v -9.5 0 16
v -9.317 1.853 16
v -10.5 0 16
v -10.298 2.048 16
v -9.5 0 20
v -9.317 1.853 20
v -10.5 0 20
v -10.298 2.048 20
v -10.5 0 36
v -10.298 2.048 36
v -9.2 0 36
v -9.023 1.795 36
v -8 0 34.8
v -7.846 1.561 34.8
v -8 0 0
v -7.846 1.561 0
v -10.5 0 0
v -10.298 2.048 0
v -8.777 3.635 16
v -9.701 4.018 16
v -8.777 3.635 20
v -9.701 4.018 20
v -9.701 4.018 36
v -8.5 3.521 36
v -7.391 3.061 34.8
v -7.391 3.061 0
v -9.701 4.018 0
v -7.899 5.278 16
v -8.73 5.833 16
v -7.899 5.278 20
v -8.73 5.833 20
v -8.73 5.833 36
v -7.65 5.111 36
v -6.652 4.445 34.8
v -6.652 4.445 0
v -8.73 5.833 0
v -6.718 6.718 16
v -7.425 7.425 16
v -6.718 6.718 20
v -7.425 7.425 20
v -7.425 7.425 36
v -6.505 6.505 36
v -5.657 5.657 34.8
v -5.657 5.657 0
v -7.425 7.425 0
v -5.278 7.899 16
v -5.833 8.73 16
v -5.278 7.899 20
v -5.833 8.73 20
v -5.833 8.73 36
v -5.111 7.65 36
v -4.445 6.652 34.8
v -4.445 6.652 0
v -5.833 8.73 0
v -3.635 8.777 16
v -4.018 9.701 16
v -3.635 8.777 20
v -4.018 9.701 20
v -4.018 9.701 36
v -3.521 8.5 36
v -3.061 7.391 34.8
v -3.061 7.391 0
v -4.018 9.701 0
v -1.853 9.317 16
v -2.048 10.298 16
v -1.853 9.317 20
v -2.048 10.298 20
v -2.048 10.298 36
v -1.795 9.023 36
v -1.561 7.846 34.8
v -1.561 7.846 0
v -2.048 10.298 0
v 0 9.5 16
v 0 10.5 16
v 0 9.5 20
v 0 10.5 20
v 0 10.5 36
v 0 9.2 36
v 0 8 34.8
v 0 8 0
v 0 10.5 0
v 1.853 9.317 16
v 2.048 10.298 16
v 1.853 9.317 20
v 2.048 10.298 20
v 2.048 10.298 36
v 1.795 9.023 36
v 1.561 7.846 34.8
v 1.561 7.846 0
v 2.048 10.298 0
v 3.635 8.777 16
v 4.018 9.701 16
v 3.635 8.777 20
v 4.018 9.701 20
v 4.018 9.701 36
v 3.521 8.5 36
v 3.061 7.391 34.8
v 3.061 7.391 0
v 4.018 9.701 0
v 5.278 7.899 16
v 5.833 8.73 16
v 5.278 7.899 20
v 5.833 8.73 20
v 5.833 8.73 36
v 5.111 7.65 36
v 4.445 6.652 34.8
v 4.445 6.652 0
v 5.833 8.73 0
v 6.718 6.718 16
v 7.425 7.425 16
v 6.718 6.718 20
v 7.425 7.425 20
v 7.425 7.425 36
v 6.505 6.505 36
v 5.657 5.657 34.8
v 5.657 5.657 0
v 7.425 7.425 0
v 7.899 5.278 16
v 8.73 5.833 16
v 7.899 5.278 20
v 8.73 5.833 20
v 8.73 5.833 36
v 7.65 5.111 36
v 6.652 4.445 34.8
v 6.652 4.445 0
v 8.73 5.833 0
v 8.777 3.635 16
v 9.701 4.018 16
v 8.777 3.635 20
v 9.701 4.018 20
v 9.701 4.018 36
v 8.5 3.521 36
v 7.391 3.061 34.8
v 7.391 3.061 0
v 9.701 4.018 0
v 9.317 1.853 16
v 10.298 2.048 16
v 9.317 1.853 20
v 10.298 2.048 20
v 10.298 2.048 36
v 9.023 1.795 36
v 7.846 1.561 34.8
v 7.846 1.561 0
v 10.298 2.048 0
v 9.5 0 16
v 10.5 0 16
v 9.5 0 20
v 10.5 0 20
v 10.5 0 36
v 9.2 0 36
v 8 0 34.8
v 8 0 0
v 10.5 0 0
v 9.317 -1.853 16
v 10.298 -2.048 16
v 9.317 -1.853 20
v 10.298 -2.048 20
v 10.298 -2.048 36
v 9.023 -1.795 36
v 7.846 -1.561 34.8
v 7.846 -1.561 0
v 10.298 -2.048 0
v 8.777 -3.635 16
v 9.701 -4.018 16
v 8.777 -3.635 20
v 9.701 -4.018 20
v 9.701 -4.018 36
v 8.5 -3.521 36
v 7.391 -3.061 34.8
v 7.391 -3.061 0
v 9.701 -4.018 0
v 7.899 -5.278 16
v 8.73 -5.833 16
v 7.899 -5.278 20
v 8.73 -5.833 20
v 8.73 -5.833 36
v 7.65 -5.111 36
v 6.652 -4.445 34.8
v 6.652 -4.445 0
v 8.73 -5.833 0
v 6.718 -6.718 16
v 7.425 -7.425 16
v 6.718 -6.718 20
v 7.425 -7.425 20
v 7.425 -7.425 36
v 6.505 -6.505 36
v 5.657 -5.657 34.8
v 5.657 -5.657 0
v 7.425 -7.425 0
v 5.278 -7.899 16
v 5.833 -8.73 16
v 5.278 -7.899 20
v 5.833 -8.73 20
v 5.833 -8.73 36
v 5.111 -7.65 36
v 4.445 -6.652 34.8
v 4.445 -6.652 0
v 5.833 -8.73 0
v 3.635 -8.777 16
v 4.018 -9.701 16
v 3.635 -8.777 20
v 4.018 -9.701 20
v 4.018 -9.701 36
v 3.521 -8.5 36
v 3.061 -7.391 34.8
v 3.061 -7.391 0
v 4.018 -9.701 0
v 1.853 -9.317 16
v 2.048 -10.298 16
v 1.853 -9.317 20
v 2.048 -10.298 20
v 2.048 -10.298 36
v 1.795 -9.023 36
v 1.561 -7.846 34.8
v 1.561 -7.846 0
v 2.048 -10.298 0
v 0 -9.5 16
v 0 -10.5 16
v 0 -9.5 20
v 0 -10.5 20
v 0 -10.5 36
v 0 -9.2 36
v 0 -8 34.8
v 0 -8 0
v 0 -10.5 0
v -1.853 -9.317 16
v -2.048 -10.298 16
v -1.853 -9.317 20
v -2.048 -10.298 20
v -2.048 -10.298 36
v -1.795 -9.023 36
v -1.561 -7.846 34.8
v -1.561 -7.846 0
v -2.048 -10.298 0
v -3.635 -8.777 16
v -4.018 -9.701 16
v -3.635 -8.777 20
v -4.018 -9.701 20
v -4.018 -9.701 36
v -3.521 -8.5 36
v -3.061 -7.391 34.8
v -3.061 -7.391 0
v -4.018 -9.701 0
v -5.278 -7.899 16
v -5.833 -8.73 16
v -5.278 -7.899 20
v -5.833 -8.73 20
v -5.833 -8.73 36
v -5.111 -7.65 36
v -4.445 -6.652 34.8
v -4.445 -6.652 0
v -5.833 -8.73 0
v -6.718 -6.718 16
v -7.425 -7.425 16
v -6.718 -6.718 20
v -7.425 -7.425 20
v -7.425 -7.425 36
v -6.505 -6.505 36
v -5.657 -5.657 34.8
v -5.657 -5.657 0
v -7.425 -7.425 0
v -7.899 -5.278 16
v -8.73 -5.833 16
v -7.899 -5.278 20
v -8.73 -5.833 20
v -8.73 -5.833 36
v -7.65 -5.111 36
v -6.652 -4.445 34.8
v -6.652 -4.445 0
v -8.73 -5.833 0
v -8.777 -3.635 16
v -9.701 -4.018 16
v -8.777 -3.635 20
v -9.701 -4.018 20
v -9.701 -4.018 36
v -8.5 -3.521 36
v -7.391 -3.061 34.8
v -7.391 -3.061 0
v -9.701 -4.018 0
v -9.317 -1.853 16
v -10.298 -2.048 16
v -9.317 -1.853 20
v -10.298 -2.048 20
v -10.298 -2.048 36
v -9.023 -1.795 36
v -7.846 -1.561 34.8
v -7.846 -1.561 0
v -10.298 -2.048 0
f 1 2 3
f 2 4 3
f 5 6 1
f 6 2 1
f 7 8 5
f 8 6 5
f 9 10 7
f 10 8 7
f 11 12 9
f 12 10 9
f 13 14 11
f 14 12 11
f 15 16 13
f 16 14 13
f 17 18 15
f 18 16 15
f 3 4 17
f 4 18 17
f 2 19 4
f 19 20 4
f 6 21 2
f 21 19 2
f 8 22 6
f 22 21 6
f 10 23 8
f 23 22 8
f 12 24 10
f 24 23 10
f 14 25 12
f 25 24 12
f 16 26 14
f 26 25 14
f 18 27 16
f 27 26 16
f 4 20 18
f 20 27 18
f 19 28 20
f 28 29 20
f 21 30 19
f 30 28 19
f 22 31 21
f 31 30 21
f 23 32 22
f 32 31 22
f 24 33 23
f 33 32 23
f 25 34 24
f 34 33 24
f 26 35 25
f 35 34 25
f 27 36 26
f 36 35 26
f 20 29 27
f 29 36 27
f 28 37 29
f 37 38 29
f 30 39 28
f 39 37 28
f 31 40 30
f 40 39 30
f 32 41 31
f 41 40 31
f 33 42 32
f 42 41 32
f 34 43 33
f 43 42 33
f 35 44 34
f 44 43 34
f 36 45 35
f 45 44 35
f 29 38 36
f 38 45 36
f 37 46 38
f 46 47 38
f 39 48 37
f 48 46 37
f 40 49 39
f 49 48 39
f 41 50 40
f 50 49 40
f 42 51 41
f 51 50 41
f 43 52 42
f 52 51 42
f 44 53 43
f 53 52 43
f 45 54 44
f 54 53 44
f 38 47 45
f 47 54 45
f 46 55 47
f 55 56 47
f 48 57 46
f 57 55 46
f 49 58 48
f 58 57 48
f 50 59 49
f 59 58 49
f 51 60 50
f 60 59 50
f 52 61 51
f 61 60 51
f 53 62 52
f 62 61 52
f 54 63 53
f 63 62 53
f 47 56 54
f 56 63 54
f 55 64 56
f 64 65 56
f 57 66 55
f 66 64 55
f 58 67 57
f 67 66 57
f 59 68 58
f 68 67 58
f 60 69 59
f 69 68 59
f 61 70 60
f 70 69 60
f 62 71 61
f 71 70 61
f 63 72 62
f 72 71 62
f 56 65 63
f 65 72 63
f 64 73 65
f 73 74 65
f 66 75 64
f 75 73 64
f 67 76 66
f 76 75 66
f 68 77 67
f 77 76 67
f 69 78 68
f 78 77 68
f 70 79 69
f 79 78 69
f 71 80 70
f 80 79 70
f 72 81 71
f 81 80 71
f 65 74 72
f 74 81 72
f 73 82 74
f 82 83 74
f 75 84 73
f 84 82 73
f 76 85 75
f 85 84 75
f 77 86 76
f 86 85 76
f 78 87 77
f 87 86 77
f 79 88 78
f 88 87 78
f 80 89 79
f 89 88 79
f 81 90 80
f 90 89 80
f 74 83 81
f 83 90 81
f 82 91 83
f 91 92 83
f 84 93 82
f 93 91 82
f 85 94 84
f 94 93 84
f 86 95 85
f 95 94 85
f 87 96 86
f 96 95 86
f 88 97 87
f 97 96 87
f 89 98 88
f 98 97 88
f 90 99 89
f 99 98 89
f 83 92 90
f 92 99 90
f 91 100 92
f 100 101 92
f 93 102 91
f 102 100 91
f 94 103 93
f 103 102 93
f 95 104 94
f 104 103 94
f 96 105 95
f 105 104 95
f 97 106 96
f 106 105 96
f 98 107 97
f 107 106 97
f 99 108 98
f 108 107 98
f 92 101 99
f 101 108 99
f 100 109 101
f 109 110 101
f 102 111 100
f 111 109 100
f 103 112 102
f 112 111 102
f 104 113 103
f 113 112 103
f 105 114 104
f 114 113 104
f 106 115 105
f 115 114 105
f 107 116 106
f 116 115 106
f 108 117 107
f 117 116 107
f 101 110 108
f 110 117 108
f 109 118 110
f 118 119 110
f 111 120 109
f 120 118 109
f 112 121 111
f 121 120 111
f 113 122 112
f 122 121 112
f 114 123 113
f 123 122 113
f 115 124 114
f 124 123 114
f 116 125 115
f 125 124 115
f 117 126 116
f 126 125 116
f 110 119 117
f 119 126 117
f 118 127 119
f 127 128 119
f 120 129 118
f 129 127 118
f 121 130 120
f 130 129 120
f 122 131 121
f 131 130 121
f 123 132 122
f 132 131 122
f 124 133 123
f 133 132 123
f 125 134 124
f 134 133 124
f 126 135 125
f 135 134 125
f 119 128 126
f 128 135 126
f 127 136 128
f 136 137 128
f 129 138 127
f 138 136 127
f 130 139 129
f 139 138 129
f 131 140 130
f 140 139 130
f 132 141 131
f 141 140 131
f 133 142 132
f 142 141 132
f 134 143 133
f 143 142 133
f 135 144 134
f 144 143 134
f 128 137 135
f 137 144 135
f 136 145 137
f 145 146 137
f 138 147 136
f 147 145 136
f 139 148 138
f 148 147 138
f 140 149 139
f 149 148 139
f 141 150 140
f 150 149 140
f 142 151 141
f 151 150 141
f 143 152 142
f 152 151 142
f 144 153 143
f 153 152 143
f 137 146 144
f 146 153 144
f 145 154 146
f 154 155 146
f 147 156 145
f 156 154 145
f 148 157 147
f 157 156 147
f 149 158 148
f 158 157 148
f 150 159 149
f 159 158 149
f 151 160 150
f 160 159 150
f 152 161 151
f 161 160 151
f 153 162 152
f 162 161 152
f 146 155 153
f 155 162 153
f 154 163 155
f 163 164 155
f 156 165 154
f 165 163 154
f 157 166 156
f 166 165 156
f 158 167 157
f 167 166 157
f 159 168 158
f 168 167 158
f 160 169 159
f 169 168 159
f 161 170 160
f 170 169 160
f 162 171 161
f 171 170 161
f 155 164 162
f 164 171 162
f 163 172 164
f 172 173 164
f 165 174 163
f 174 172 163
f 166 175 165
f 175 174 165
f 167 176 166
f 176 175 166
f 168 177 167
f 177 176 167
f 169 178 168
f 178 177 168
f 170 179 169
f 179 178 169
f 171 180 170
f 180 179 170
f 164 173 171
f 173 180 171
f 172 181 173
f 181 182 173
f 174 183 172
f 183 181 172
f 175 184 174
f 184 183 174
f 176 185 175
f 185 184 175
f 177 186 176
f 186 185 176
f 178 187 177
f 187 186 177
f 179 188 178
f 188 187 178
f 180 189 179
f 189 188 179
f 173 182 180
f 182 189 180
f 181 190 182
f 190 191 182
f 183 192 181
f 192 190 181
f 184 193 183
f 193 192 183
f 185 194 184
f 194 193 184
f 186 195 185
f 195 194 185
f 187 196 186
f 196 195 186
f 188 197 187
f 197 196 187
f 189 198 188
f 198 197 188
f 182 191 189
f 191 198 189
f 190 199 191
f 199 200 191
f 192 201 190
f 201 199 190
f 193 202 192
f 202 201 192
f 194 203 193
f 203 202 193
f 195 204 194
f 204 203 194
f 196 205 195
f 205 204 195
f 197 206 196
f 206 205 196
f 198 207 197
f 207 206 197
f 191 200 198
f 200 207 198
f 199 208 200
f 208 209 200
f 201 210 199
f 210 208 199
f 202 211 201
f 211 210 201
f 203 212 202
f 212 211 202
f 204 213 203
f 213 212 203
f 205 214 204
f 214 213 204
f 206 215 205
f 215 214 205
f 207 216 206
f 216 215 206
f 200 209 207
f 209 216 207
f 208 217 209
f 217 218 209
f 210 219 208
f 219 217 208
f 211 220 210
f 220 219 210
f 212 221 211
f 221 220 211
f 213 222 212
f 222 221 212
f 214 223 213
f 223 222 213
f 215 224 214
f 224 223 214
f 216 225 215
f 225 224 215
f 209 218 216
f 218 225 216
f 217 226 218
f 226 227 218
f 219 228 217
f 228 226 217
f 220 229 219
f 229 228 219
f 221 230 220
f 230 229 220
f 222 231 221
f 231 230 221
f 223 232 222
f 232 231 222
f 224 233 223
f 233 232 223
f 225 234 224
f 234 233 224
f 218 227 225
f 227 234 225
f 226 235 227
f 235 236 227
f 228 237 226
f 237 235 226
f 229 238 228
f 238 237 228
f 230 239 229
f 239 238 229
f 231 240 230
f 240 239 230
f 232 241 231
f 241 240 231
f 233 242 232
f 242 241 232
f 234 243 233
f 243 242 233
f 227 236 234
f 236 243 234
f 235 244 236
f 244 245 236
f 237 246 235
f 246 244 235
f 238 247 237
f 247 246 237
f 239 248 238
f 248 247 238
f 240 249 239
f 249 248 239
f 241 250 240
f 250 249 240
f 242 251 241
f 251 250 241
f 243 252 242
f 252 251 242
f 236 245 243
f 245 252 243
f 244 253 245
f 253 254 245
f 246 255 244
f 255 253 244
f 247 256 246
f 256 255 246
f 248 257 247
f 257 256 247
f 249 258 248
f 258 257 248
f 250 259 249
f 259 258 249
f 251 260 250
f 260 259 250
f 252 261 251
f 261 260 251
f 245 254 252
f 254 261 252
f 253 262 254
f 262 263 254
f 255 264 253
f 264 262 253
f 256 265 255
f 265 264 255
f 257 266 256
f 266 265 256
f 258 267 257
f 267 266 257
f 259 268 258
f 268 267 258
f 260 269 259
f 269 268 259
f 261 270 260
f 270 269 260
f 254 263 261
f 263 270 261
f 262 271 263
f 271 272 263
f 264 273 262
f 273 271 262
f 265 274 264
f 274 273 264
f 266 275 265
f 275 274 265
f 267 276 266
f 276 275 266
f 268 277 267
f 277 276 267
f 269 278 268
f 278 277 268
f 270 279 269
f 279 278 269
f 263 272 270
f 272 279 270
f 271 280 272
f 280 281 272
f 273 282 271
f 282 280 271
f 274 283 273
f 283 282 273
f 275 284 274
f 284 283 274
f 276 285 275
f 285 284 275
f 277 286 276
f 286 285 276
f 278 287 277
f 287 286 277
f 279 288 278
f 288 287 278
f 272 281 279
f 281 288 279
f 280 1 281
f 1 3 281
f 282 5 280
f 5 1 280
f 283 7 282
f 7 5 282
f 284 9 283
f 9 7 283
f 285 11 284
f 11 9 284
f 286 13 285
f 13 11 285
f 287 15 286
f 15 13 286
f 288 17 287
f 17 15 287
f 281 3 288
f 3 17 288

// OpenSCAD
$fn = 32;

// ----------------------------------------------------------------------
// Grooved revolve: thread_relief, bore R8
// ----------------------------------------------------------------------

// --- parameters (mm) ---
bore_r = 8;               // bore radius
outer_r = 10.5;           // outer radius of the body
total_h = 36;             // overall height, Z
wall = 2.5;               // radial wall thickness
groove_w = 4;             // groove width
groove_d = 1;             // groove depth
grooves = 1;              // number of outer grooves
relief = 1.2;             // thread relief leg at the bore mouth
relief_angle = 45;        // thread relief chamfer angle, degrees
fit_tol = 0.1;            // declared fit tolerance (prompt contract)
free_tol = 0.5;           // declared free tolerance (prompt contract)

bbox_x = 2 * outer_r;  // full diameter
bore_d = 2 * bore_r;  // bore diameter
body_d = 2 * outer_r;  // body diameter
revolve_angle = 360;  // full turn around the Z axis

profile = [[8, 0], [10.5, 0], [10.5, 16], [9.5, 16], [9.5, 20], [10.5, 20], [10.5, 36], [9.2, 36], [8, 34.8]];  // primary outline, 9 points, counter clockwise

// --- the one profile operation ---
rotate_extrude(angle = revolve_angle) polygon(points = profile);
